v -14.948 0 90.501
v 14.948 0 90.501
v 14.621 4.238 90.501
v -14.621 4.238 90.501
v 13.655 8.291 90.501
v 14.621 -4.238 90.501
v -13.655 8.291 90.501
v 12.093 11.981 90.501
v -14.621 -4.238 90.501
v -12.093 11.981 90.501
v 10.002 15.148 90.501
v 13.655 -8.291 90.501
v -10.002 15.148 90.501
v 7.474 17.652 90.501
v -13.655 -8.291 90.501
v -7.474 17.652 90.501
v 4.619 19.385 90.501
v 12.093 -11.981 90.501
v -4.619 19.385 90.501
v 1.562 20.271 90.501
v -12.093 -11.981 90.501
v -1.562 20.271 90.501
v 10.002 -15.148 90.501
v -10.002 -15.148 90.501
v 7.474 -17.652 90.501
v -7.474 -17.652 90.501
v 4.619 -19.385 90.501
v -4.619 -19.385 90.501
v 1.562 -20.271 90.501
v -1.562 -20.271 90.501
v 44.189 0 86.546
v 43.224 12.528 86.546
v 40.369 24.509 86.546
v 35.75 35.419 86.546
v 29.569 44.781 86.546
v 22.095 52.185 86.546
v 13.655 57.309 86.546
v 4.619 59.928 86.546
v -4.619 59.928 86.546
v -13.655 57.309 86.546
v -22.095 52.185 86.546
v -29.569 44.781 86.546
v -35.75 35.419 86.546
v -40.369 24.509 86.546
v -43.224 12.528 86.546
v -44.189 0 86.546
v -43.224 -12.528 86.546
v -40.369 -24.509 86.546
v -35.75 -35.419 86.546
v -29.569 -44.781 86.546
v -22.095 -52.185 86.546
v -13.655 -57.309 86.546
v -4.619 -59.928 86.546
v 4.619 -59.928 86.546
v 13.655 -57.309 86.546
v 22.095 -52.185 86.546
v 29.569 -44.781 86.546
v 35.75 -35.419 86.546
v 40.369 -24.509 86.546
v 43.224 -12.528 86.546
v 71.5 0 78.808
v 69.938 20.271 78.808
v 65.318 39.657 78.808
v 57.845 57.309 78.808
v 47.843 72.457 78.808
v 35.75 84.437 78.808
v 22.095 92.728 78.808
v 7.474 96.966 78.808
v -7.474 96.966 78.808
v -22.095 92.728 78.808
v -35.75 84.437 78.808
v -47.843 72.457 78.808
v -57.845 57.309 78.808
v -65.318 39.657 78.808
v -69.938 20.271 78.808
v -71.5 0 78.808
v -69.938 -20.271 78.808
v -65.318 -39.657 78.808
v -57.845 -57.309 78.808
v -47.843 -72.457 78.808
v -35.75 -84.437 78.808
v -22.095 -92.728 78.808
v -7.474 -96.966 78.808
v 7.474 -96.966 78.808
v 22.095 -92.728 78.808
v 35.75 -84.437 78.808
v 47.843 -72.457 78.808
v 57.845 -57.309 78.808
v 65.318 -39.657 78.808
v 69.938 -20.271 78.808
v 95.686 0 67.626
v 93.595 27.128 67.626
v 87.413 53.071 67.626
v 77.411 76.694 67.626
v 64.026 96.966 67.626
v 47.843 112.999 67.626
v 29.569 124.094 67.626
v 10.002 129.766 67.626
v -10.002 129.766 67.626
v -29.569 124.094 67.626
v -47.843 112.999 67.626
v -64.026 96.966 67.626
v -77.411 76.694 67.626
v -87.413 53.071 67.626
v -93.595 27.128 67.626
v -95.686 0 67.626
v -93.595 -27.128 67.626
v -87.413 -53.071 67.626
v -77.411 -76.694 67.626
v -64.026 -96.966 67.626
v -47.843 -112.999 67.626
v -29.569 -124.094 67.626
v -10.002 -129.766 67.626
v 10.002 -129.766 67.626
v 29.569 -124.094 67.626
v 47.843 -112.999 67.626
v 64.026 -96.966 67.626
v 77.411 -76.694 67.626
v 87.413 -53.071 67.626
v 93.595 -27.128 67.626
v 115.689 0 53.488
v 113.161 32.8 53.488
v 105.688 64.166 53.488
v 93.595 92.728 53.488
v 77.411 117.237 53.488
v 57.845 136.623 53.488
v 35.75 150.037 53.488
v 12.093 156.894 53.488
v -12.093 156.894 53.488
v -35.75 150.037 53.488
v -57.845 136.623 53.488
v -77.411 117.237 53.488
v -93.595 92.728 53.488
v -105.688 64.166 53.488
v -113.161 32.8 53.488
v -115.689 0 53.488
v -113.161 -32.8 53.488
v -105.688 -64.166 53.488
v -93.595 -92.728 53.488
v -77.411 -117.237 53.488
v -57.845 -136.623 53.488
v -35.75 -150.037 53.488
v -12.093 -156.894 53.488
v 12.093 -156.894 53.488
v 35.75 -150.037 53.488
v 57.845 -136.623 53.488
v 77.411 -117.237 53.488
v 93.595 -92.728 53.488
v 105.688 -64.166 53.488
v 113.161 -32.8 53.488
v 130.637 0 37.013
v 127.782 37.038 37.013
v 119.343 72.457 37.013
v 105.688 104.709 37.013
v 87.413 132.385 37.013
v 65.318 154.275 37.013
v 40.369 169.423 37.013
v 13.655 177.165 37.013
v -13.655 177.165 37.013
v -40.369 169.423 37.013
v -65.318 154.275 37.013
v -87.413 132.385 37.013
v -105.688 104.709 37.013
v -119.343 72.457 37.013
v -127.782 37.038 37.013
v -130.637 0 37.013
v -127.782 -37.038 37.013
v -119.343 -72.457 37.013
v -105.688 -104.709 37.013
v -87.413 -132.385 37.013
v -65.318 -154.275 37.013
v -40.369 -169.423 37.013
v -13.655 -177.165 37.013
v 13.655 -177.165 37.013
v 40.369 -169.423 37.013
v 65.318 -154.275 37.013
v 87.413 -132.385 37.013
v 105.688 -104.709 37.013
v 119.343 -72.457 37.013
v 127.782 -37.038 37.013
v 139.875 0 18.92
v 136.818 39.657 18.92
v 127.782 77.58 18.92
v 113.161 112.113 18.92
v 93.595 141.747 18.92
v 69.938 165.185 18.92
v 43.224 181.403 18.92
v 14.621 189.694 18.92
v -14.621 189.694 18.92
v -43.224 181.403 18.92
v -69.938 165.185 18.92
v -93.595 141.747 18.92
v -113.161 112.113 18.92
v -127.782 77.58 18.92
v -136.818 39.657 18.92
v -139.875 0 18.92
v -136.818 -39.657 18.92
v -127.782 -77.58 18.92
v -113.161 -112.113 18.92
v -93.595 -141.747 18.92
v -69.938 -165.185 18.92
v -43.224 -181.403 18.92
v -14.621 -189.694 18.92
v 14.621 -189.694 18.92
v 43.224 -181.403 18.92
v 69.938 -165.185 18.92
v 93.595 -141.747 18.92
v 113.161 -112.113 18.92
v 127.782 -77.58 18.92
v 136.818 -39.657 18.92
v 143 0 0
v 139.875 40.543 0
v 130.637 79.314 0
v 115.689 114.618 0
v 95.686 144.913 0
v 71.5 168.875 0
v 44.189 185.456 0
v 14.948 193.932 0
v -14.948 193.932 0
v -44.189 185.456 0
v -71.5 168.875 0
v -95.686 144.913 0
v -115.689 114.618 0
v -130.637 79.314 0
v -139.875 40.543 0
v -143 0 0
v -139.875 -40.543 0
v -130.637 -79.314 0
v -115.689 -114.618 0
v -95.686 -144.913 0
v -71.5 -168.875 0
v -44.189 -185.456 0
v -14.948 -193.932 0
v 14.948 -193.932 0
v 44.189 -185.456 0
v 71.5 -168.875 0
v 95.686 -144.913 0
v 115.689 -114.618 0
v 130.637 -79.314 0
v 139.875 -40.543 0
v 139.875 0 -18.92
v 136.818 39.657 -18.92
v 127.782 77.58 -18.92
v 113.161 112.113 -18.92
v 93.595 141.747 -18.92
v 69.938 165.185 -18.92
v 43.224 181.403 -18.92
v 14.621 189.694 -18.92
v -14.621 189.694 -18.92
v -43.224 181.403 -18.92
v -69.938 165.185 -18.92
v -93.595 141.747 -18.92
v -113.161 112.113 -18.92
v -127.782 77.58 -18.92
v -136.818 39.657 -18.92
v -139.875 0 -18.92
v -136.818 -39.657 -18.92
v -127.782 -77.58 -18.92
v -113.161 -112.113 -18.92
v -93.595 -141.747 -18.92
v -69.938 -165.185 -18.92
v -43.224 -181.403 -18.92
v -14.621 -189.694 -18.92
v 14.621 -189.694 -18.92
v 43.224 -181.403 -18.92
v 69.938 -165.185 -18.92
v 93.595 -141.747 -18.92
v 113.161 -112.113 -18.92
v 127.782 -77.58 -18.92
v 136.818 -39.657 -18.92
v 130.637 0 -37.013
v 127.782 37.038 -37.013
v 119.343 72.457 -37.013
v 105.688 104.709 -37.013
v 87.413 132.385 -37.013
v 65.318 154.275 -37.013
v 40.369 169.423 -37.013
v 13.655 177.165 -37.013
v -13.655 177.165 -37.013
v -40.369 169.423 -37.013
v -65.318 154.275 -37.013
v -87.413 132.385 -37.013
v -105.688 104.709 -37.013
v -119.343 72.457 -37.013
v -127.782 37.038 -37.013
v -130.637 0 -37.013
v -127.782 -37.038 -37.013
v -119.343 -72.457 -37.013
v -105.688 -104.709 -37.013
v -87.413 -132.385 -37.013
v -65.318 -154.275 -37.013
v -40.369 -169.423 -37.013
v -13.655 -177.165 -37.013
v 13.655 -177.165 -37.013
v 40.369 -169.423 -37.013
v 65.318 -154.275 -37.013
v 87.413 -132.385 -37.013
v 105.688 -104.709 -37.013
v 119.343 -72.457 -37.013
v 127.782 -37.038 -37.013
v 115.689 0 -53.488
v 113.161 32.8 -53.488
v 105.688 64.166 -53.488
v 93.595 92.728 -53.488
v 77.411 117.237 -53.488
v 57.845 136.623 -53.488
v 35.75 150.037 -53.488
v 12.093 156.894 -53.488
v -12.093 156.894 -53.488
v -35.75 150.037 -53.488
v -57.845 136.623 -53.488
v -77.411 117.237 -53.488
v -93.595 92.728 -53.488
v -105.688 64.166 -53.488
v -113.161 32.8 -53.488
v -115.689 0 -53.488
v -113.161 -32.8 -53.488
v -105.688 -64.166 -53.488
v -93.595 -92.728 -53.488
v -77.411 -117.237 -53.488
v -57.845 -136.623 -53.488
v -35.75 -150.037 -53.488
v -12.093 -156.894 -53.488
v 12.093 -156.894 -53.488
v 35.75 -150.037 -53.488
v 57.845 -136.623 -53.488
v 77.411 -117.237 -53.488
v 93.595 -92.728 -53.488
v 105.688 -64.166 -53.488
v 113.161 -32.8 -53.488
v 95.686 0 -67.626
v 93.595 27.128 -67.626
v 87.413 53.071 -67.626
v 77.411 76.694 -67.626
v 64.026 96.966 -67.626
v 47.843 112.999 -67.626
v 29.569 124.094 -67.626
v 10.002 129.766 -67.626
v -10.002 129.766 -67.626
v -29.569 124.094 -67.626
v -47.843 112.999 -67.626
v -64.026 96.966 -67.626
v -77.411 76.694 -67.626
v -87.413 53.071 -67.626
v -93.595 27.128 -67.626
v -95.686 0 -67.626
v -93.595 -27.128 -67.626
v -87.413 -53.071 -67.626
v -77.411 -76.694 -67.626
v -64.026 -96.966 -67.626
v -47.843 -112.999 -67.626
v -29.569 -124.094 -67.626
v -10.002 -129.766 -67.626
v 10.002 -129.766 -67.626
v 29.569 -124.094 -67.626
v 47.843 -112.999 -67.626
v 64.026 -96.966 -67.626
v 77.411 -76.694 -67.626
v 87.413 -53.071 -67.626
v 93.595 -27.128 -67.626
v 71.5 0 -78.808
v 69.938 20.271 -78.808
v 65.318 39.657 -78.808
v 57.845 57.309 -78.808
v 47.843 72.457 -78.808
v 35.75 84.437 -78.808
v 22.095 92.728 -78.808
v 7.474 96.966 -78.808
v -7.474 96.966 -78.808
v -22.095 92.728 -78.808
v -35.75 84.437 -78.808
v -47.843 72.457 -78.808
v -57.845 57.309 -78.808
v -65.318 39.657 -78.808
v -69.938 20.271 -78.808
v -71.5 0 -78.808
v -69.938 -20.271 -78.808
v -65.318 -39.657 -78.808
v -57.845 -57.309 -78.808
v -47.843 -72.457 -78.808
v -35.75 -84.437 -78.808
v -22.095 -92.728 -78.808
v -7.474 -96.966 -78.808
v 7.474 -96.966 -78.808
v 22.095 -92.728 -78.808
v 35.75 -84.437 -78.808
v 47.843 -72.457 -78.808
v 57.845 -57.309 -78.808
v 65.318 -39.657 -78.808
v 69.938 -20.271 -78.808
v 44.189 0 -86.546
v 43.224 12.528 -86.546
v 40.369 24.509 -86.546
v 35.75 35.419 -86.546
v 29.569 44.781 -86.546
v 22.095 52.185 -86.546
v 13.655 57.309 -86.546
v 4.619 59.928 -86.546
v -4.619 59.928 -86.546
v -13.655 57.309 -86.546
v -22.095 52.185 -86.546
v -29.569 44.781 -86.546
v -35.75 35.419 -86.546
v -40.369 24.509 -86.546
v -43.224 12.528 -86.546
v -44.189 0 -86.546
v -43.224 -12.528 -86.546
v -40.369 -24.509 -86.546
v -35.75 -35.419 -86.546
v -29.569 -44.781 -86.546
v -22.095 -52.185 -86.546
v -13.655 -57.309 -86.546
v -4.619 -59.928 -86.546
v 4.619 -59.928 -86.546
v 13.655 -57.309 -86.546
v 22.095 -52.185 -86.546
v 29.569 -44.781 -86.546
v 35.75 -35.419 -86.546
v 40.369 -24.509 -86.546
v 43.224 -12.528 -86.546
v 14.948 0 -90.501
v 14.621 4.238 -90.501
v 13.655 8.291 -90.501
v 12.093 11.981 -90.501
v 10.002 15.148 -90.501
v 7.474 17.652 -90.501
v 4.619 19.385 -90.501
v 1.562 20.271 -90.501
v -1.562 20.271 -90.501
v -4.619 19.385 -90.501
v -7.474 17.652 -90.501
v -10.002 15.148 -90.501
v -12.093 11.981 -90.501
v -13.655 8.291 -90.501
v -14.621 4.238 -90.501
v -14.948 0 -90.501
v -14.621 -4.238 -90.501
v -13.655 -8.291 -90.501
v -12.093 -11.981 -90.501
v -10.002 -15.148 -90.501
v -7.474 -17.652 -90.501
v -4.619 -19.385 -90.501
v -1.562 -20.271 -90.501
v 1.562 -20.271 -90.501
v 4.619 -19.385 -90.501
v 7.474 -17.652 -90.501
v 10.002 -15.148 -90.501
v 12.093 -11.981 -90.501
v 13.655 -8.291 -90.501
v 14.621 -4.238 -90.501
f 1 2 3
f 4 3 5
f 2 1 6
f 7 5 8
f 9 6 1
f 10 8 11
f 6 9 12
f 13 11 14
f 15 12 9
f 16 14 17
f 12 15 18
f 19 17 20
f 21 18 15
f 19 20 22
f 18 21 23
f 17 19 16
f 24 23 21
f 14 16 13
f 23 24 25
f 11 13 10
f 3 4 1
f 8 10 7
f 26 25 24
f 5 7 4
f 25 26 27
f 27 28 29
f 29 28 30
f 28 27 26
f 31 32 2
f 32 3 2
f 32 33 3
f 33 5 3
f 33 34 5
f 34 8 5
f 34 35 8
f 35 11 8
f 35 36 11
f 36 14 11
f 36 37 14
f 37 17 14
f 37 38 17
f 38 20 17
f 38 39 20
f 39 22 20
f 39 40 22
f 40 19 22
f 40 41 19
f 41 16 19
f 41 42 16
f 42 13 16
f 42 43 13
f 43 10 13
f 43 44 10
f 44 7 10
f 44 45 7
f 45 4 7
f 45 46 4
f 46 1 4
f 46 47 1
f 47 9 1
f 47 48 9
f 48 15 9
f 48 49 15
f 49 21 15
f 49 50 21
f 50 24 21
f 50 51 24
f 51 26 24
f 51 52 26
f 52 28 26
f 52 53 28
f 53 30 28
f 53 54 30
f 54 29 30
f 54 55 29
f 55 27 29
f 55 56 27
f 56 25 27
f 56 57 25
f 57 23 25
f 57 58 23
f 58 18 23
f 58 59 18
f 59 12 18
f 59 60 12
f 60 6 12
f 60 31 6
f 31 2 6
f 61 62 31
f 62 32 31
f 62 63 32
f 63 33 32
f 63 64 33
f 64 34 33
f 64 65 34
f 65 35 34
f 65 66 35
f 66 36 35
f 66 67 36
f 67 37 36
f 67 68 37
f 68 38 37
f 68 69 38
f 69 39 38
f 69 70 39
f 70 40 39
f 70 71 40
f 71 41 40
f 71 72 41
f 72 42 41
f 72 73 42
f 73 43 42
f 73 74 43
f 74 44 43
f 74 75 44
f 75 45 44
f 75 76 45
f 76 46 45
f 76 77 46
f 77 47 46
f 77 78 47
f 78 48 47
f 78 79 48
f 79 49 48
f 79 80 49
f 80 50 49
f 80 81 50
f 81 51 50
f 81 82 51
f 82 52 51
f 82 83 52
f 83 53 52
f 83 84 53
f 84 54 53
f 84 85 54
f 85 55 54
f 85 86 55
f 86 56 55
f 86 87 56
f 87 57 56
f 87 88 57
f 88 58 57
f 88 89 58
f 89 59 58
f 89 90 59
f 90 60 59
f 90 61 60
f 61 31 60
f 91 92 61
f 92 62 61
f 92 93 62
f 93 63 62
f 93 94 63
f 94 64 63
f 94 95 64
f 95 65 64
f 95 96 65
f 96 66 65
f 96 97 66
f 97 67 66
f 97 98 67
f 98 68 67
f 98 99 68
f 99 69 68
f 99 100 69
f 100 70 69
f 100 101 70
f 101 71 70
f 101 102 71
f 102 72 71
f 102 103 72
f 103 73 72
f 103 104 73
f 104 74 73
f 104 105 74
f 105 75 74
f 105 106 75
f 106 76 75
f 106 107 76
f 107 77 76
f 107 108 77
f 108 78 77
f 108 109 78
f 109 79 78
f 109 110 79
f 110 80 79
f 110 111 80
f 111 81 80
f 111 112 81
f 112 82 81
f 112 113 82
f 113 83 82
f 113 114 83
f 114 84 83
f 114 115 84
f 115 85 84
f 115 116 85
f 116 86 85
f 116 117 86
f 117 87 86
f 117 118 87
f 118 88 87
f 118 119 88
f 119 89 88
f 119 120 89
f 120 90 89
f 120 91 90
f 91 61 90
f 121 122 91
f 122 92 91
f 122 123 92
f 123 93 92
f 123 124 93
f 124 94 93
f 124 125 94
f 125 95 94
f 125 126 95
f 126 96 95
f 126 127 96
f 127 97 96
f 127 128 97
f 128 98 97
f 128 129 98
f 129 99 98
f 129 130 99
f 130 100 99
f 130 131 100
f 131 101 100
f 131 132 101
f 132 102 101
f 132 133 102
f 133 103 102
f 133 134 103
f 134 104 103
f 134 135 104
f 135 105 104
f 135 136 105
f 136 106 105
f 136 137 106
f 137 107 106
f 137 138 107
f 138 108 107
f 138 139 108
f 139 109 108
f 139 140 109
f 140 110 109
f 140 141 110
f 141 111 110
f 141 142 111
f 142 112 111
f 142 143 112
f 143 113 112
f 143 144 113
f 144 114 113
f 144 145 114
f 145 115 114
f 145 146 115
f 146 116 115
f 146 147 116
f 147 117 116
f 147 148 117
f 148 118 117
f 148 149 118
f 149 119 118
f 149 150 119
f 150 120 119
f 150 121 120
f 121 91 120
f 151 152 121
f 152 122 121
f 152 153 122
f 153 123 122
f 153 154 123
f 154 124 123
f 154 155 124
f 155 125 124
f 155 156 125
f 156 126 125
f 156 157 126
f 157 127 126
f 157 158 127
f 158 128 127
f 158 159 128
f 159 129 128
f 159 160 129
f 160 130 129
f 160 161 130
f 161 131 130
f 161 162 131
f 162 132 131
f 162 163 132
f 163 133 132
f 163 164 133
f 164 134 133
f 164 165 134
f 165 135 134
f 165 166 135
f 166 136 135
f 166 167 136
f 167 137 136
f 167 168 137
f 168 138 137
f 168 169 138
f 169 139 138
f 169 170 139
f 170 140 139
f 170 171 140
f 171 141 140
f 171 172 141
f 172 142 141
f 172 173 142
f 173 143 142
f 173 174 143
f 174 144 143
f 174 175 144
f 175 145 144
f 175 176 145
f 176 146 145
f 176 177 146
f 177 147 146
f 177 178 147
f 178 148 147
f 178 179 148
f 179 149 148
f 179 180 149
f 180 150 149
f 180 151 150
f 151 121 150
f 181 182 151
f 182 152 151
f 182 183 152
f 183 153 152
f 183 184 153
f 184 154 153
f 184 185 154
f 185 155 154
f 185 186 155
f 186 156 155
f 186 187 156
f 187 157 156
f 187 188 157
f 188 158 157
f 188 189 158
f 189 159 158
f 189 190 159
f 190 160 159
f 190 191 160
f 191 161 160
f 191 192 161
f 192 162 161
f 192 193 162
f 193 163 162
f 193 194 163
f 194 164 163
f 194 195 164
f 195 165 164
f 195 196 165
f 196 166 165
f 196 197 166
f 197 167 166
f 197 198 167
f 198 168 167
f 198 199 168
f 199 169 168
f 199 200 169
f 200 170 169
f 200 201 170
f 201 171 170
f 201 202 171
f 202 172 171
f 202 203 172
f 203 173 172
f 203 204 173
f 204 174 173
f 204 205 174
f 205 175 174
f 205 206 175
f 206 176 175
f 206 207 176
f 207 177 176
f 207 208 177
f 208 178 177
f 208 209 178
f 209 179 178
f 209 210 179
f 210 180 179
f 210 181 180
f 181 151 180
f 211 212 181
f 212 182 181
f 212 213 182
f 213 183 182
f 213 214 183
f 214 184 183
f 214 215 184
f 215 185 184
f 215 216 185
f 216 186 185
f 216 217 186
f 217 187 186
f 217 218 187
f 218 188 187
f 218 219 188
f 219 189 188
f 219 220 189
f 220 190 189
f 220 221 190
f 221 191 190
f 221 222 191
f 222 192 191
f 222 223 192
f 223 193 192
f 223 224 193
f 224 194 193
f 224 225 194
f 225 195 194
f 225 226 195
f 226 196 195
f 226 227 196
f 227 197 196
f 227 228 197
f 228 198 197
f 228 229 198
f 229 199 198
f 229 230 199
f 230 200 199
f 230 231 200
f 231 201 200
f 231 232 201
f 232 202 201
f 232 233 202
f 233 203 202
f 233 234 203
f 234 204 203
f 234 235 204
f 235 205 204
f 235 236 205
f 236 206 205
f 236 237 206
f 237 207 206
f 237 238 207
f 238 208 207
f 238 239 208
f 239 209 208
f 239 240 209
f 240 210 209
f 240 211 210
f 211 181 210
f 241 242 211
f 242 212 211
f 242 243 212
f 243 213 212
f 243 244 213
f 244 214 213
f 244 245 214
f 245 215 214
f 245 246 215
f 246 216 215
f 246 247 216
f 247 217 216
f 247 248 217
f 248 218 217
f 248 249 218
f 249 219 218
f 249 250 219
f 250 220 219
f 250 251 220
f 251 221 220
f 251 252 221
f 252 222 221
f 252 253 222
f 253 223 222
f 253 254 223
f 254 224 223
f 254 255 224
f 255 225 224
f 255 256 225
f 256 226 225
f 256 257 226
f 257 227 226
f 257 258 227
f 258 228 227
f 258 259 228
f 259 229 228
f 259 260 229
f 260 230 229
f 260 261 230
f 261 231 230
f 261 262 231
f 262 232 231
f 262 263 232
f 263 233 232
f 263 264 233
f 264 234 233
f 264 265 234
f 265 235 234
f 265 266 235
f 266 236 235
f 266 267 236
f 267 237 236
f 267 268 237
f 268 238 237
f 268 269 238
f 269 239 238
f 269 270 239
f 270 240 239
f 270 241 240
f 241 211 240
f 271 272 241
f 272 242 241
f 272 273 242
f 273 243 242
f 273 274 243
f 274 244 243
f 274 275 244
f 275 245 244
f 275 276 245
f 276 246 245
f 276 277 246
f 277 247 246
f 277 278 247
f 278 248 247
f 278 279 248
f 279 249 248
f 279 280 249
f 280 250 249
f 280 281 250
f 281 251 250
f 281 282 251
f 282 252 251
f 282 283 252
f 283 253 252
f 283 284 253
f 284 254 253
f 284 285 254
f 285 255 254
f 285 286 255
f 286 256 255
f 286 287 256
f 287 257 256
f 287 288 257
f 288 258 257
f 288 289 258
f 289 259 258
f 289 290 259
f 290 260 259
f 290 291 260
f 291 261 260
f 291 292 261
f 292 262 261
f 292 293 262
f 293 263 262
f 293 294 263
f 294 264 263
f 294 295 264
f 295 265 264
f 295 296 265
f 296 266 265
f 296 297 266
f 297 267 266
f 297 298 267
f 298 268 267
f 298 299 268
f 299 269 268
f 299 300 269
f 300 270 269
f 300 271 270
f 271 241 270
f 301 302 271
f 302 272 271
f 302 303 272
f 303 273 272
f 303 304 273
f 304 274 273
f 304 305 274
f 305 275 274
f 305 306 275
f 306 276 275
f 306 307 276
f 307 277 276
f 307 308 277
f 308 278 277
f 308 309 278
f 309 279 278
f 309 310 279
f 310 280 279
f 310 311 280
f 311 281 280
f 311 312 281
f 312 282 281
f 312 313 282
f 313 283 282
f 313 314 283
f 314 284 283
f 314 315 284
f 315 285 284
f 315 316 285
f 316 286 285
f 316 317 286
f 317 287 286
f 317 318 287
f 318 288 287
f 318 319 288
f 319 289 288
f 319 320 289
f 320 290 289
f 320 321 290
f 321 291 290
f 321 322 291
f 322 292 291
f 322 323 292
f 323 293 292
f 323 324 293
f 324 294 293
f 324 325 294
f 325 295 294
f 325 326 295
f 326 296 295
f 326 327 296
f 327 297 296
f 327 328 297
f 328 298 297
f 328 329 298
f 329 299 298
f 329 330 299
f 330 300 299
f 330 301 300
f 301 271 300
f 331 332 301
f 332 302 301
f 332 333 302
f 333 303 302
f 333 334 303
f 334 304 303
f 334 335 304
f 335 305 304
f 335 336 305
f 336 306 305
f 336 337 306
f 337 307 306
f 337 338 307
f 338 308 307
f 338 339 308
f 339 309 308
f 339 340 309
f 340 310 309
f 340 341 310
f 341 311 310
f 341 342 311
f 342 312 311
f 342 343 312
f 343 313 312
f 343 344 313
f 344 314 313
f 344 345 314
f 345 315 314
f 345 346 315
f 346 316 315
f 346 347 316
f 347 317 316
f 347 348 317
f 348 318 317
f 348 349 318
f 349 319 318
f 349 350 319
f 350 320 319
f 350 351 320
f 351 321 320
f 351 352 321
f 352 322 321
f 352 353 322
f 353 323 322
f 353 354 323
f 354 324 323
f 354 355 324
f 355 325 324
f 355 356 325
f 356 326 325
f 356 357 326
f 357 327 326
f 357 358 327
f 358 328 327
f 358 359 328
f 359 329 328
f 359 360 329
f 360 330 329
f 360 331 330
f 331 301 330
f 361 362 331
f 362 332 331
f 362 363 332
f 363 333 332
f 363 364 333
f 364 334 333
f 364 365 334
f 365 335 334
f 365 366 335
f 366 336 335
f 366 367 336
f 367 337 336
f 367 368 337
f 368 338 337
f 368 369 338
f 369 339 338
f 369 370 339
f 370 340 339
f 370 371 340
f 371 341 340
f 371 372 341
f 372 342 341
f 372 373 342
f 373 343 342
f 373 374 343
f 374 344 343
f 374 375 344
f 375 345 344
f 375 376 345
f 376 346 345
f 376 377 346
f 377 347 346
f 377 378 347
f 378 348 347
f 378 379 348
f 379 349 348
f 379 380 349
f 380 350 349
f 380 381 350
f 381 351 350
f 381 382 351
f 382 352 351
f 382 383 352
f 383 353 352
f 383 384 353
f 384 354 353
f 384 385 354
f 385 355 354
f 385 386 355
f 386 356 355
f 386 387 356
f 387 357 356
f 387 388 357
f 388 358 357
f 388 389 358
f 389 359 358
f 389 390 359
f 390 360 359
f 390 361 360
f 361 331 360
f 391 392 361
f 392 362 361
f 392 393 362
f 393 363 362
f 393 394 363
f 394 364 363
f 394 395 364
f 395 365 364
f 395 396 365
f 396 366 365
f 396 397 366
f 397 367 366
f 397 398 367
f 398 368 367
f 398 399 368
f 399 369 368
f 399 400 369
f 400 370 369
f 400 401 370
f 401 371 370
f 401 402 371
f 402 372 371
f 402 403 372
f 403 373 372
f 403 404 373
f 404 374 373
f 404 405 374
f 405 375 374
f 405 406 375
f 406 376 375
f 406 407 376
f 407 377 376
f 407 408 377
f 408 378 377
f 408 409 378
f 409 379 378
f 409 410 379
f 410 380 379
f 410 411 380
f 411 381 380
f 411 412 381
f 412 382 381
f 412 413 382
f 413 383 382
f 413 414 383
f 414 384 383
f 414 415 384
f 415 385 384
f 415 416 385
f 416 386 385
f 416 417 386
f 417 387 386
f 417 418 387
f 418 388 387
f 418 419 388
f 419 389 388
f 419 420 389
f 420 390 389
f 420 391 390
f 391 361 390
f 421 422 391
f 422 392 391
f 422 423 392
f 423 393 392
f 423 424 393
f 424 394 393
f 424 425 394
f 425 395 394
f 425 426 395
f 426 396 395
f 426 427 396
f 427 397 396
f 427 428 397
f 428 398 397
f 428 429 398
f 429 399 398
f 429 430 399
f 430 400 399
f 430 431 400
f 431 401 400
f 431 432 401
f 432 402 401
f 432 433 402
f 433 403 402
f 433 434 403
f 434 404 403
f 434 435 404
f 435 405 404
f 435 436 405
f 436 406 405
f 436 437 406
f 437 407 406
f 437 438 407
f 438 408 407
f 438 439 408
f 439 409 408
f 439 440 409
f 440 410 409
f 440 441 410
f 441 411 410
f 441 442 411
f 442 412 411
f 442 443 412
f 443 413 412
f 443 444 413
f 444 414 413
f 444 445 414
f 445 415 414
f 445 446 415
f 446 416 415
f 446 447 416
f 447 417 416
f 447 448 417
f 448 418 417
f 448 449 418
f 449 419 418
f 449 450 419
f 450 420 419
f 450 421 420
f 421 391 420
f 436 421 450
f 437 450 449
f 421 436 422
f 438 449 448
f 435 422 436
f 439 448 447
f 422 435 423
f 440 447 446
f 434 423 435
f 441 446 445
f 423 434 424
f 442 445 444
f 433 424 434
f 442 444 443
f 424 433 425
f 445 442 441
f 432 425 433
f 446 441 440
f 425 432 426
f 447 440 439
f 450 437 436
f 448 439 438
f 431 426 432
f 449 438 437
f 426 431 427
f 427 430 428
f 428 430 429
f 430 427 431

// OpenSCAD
// Generated by SolidPython 1.0.1 on 2020-07-29 00:46:50


scale(v = [11, 15, 7]) {
	sphere(r = 13);
}
/***********************************************
*********      SolidPython code:      **********
************************************************
 
# import packages: SolidPython
from solid import *
from solid.utils import *
from itertools import chain, combinations, permutations


class Resize:

    def __init__(self, scad_file):
        self.scad_file = scad_file
        #self.scad_file = import_scad(scad_file)
        # cone/cylinder param:
        self.r1 = 0
        self.r2 = 0
        self.h = 0
        # rectangular prism param:
        self.w = 0
        self.l = 0
        # ellipse param:
        self.r = 0

    # import OpenScad code (file name corresponds to shape)


    # classify shape + parameters
    def assign(self, param1, param2, param3):
        if self.scad_file == 'cone.scad':
            self.r1 = param1
            self.r2 = param2
            self.h = param3
        elif self.scad_file == 'cylinder.scad':
            self.r1 = param1
            self.r2 = param2
            self.h = param3
        elif self.scad_file == 'rectangularPrism.scad':
            self.h = param1
            self.l = param2
            self.w = param3
        else:
            self.r = param1
            self.h = param2

    # resize parameters
    def iterate(self):
        x = range(3, 20, 2)
        i = 1
        if self.scad_file == 'cone.scad':
            tempList = list(permutations(x, 2))
            for temp in tempList:
                param1 = temp[0]
                param2 = temp[1]
                filepath = 'produced_scad_files/' + 'cone' + str(param1) + '_' + str(param2) + '_' + '.scad'
                scad_render_to_file(cylinder(h=param1, r1=param2, r2=0), filepath)

        elif self.scad_file == 'cylinder.scad':
            tempList = list(permutations(x, 3))
            for temp in tempList:
                param1 = temp[0]
                param2 = temp[1]
                filepath = 'produced_scad_files/' + 'cylinder' + str(param1) + '_' + str(param2) + '_' + '.scad'
                scad_render_to_file(cylinder(h=param1, r1=param2, r2=param2), filepath)

        elif self.scad_file == 'rectangularPrism.scad':
            tempList = list(permutations(x, 3))
            for temp in tempList:
                param1 = temp[0]
                param2 = temp[1]
                param3 = temp[2]
                filepath = 'produced_scad_files/' + 'rectangularPrism' + str(param1) + '_' + str(param2) + '_' + str(
                    param3) + '.scad'
                scad_render_to_file(cube(size=(param1, param2, param3)), filepath)

        elif self.scad_file == 'ellipse.scad':
            tempList = list(permutations(x, 4))
            for temp in tempList:
                param1 = temp[0]
                param2 = temp[1]
                param3 = temp[2]
                param4 = temp[3]
                filepath = 'produced_scad_files/' + 'ellipse' + str(param1) + '_' + str(param2) + '_' + str(param3) + '_' + str(param4) + '.scad'
                scad_render_to_file(scale([param1, param2, param3])(sphere(r=param4)), filepath)

    def render_to_scadfile(self):
        scad_render_to_file(scad, 'example.scad') 
 
************************************************/
